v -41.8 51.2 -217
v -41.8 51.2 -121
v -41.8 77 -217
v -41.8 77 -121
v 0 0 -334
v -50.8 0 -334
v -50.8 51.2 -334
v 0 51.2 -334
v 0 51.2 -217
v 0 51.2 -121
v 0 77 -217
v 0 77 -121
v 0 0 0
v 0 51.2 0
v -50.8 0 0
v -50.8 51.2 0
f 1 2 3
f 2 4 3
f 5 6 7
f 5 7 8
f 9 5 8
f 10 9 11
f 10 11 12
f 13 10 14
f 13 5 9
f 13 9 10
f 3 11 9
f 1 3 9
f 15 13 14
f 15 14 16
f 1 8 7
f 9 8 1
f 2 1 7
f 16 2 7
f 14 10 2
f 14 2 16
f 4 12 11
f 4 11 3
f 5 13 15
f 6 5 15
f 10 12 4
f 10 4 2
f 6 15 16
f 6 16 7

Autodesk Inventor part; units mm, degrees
ref_plane "YZ Plane" through (0, 0, 0) normal (1, 0, 0) x (0, 1, 0)
ref_plane "XZ Plane" through (0, 0, 0) normal (0, 1, 0) x (-1, 0, 0)
ref_plane "XY Plane" through (0, 0, 0) normal (0, 0, 1) x (1, 0, 0)
sketch "Sketch1" plane through (0, 0, 0) normal (0, 1, 0) x (-1, 0, 0)
  line L0 (0, 0) -> (50.8, 0)
  line L1 (50.8, 0) -> (50.8, -334)
  line L2 (50.8, -334) -> (0, -334)
  line L3 (0, -334) -> (0, 0)
  dimension "d0" = 50.8
  dimension "d1" = 334
extrude "Extrusion1" add sketch "Sketch1" along normal blind 77
sketch "Sketch3" plane through (0, 0, 0) normal (1, 0, 0) x (0, 0, -1)
  line L0 (0, 77) -> (121, 77)
  line L1 (121, 77) -> (121, 51.2)
  line L2 (121, 51.2) -> (0, 51.2)
  line L3 (0, 51.2) -> (0, 77)
  line L4 (0, 77) -> (334, 77) projected
  line L5 (334, 77) -> (217, 77)
  line L6 (217, 77) -> (217, 51.2)
  line L7 (217, 51.2) -> (334, 51.2)
  line L8 (334, 51.2) -> (334, 77)
  point P0 (0, 0)
  dimension "d9" = 25.8
  dimension "d10" = 117
  dimension "d11" = 25.8
  dimension "d17" = 96
extrude "Extrusion2" cut sketch "Sketch3" against normal blind 52.8
sketch "Sketch6" plane through (0, 77, 0) normal (0, 1, 0) x (1, 0, 0)
  line L0 (-50.8, 217) -> (-50.8, 121) projected
  line L1 (0, 217) -> (-50.8, 217) projected
  line L2 (-50.8, 121) -> (-41.8, 121)
  line L3 (-41.8, 121) -> (-41.8, 217)
  line L4 (-41.8, 217) -> (-50.8, 217)
  line L5 (-50.8, 217) -> (-50.8, 121)
  point P0 (0, 0)
  dimension "d18" = 9
extrude "Extrusion4" cut sketch "Sketch6" against normal blind 25.8
properties part number "PiezaPuerta-1"
